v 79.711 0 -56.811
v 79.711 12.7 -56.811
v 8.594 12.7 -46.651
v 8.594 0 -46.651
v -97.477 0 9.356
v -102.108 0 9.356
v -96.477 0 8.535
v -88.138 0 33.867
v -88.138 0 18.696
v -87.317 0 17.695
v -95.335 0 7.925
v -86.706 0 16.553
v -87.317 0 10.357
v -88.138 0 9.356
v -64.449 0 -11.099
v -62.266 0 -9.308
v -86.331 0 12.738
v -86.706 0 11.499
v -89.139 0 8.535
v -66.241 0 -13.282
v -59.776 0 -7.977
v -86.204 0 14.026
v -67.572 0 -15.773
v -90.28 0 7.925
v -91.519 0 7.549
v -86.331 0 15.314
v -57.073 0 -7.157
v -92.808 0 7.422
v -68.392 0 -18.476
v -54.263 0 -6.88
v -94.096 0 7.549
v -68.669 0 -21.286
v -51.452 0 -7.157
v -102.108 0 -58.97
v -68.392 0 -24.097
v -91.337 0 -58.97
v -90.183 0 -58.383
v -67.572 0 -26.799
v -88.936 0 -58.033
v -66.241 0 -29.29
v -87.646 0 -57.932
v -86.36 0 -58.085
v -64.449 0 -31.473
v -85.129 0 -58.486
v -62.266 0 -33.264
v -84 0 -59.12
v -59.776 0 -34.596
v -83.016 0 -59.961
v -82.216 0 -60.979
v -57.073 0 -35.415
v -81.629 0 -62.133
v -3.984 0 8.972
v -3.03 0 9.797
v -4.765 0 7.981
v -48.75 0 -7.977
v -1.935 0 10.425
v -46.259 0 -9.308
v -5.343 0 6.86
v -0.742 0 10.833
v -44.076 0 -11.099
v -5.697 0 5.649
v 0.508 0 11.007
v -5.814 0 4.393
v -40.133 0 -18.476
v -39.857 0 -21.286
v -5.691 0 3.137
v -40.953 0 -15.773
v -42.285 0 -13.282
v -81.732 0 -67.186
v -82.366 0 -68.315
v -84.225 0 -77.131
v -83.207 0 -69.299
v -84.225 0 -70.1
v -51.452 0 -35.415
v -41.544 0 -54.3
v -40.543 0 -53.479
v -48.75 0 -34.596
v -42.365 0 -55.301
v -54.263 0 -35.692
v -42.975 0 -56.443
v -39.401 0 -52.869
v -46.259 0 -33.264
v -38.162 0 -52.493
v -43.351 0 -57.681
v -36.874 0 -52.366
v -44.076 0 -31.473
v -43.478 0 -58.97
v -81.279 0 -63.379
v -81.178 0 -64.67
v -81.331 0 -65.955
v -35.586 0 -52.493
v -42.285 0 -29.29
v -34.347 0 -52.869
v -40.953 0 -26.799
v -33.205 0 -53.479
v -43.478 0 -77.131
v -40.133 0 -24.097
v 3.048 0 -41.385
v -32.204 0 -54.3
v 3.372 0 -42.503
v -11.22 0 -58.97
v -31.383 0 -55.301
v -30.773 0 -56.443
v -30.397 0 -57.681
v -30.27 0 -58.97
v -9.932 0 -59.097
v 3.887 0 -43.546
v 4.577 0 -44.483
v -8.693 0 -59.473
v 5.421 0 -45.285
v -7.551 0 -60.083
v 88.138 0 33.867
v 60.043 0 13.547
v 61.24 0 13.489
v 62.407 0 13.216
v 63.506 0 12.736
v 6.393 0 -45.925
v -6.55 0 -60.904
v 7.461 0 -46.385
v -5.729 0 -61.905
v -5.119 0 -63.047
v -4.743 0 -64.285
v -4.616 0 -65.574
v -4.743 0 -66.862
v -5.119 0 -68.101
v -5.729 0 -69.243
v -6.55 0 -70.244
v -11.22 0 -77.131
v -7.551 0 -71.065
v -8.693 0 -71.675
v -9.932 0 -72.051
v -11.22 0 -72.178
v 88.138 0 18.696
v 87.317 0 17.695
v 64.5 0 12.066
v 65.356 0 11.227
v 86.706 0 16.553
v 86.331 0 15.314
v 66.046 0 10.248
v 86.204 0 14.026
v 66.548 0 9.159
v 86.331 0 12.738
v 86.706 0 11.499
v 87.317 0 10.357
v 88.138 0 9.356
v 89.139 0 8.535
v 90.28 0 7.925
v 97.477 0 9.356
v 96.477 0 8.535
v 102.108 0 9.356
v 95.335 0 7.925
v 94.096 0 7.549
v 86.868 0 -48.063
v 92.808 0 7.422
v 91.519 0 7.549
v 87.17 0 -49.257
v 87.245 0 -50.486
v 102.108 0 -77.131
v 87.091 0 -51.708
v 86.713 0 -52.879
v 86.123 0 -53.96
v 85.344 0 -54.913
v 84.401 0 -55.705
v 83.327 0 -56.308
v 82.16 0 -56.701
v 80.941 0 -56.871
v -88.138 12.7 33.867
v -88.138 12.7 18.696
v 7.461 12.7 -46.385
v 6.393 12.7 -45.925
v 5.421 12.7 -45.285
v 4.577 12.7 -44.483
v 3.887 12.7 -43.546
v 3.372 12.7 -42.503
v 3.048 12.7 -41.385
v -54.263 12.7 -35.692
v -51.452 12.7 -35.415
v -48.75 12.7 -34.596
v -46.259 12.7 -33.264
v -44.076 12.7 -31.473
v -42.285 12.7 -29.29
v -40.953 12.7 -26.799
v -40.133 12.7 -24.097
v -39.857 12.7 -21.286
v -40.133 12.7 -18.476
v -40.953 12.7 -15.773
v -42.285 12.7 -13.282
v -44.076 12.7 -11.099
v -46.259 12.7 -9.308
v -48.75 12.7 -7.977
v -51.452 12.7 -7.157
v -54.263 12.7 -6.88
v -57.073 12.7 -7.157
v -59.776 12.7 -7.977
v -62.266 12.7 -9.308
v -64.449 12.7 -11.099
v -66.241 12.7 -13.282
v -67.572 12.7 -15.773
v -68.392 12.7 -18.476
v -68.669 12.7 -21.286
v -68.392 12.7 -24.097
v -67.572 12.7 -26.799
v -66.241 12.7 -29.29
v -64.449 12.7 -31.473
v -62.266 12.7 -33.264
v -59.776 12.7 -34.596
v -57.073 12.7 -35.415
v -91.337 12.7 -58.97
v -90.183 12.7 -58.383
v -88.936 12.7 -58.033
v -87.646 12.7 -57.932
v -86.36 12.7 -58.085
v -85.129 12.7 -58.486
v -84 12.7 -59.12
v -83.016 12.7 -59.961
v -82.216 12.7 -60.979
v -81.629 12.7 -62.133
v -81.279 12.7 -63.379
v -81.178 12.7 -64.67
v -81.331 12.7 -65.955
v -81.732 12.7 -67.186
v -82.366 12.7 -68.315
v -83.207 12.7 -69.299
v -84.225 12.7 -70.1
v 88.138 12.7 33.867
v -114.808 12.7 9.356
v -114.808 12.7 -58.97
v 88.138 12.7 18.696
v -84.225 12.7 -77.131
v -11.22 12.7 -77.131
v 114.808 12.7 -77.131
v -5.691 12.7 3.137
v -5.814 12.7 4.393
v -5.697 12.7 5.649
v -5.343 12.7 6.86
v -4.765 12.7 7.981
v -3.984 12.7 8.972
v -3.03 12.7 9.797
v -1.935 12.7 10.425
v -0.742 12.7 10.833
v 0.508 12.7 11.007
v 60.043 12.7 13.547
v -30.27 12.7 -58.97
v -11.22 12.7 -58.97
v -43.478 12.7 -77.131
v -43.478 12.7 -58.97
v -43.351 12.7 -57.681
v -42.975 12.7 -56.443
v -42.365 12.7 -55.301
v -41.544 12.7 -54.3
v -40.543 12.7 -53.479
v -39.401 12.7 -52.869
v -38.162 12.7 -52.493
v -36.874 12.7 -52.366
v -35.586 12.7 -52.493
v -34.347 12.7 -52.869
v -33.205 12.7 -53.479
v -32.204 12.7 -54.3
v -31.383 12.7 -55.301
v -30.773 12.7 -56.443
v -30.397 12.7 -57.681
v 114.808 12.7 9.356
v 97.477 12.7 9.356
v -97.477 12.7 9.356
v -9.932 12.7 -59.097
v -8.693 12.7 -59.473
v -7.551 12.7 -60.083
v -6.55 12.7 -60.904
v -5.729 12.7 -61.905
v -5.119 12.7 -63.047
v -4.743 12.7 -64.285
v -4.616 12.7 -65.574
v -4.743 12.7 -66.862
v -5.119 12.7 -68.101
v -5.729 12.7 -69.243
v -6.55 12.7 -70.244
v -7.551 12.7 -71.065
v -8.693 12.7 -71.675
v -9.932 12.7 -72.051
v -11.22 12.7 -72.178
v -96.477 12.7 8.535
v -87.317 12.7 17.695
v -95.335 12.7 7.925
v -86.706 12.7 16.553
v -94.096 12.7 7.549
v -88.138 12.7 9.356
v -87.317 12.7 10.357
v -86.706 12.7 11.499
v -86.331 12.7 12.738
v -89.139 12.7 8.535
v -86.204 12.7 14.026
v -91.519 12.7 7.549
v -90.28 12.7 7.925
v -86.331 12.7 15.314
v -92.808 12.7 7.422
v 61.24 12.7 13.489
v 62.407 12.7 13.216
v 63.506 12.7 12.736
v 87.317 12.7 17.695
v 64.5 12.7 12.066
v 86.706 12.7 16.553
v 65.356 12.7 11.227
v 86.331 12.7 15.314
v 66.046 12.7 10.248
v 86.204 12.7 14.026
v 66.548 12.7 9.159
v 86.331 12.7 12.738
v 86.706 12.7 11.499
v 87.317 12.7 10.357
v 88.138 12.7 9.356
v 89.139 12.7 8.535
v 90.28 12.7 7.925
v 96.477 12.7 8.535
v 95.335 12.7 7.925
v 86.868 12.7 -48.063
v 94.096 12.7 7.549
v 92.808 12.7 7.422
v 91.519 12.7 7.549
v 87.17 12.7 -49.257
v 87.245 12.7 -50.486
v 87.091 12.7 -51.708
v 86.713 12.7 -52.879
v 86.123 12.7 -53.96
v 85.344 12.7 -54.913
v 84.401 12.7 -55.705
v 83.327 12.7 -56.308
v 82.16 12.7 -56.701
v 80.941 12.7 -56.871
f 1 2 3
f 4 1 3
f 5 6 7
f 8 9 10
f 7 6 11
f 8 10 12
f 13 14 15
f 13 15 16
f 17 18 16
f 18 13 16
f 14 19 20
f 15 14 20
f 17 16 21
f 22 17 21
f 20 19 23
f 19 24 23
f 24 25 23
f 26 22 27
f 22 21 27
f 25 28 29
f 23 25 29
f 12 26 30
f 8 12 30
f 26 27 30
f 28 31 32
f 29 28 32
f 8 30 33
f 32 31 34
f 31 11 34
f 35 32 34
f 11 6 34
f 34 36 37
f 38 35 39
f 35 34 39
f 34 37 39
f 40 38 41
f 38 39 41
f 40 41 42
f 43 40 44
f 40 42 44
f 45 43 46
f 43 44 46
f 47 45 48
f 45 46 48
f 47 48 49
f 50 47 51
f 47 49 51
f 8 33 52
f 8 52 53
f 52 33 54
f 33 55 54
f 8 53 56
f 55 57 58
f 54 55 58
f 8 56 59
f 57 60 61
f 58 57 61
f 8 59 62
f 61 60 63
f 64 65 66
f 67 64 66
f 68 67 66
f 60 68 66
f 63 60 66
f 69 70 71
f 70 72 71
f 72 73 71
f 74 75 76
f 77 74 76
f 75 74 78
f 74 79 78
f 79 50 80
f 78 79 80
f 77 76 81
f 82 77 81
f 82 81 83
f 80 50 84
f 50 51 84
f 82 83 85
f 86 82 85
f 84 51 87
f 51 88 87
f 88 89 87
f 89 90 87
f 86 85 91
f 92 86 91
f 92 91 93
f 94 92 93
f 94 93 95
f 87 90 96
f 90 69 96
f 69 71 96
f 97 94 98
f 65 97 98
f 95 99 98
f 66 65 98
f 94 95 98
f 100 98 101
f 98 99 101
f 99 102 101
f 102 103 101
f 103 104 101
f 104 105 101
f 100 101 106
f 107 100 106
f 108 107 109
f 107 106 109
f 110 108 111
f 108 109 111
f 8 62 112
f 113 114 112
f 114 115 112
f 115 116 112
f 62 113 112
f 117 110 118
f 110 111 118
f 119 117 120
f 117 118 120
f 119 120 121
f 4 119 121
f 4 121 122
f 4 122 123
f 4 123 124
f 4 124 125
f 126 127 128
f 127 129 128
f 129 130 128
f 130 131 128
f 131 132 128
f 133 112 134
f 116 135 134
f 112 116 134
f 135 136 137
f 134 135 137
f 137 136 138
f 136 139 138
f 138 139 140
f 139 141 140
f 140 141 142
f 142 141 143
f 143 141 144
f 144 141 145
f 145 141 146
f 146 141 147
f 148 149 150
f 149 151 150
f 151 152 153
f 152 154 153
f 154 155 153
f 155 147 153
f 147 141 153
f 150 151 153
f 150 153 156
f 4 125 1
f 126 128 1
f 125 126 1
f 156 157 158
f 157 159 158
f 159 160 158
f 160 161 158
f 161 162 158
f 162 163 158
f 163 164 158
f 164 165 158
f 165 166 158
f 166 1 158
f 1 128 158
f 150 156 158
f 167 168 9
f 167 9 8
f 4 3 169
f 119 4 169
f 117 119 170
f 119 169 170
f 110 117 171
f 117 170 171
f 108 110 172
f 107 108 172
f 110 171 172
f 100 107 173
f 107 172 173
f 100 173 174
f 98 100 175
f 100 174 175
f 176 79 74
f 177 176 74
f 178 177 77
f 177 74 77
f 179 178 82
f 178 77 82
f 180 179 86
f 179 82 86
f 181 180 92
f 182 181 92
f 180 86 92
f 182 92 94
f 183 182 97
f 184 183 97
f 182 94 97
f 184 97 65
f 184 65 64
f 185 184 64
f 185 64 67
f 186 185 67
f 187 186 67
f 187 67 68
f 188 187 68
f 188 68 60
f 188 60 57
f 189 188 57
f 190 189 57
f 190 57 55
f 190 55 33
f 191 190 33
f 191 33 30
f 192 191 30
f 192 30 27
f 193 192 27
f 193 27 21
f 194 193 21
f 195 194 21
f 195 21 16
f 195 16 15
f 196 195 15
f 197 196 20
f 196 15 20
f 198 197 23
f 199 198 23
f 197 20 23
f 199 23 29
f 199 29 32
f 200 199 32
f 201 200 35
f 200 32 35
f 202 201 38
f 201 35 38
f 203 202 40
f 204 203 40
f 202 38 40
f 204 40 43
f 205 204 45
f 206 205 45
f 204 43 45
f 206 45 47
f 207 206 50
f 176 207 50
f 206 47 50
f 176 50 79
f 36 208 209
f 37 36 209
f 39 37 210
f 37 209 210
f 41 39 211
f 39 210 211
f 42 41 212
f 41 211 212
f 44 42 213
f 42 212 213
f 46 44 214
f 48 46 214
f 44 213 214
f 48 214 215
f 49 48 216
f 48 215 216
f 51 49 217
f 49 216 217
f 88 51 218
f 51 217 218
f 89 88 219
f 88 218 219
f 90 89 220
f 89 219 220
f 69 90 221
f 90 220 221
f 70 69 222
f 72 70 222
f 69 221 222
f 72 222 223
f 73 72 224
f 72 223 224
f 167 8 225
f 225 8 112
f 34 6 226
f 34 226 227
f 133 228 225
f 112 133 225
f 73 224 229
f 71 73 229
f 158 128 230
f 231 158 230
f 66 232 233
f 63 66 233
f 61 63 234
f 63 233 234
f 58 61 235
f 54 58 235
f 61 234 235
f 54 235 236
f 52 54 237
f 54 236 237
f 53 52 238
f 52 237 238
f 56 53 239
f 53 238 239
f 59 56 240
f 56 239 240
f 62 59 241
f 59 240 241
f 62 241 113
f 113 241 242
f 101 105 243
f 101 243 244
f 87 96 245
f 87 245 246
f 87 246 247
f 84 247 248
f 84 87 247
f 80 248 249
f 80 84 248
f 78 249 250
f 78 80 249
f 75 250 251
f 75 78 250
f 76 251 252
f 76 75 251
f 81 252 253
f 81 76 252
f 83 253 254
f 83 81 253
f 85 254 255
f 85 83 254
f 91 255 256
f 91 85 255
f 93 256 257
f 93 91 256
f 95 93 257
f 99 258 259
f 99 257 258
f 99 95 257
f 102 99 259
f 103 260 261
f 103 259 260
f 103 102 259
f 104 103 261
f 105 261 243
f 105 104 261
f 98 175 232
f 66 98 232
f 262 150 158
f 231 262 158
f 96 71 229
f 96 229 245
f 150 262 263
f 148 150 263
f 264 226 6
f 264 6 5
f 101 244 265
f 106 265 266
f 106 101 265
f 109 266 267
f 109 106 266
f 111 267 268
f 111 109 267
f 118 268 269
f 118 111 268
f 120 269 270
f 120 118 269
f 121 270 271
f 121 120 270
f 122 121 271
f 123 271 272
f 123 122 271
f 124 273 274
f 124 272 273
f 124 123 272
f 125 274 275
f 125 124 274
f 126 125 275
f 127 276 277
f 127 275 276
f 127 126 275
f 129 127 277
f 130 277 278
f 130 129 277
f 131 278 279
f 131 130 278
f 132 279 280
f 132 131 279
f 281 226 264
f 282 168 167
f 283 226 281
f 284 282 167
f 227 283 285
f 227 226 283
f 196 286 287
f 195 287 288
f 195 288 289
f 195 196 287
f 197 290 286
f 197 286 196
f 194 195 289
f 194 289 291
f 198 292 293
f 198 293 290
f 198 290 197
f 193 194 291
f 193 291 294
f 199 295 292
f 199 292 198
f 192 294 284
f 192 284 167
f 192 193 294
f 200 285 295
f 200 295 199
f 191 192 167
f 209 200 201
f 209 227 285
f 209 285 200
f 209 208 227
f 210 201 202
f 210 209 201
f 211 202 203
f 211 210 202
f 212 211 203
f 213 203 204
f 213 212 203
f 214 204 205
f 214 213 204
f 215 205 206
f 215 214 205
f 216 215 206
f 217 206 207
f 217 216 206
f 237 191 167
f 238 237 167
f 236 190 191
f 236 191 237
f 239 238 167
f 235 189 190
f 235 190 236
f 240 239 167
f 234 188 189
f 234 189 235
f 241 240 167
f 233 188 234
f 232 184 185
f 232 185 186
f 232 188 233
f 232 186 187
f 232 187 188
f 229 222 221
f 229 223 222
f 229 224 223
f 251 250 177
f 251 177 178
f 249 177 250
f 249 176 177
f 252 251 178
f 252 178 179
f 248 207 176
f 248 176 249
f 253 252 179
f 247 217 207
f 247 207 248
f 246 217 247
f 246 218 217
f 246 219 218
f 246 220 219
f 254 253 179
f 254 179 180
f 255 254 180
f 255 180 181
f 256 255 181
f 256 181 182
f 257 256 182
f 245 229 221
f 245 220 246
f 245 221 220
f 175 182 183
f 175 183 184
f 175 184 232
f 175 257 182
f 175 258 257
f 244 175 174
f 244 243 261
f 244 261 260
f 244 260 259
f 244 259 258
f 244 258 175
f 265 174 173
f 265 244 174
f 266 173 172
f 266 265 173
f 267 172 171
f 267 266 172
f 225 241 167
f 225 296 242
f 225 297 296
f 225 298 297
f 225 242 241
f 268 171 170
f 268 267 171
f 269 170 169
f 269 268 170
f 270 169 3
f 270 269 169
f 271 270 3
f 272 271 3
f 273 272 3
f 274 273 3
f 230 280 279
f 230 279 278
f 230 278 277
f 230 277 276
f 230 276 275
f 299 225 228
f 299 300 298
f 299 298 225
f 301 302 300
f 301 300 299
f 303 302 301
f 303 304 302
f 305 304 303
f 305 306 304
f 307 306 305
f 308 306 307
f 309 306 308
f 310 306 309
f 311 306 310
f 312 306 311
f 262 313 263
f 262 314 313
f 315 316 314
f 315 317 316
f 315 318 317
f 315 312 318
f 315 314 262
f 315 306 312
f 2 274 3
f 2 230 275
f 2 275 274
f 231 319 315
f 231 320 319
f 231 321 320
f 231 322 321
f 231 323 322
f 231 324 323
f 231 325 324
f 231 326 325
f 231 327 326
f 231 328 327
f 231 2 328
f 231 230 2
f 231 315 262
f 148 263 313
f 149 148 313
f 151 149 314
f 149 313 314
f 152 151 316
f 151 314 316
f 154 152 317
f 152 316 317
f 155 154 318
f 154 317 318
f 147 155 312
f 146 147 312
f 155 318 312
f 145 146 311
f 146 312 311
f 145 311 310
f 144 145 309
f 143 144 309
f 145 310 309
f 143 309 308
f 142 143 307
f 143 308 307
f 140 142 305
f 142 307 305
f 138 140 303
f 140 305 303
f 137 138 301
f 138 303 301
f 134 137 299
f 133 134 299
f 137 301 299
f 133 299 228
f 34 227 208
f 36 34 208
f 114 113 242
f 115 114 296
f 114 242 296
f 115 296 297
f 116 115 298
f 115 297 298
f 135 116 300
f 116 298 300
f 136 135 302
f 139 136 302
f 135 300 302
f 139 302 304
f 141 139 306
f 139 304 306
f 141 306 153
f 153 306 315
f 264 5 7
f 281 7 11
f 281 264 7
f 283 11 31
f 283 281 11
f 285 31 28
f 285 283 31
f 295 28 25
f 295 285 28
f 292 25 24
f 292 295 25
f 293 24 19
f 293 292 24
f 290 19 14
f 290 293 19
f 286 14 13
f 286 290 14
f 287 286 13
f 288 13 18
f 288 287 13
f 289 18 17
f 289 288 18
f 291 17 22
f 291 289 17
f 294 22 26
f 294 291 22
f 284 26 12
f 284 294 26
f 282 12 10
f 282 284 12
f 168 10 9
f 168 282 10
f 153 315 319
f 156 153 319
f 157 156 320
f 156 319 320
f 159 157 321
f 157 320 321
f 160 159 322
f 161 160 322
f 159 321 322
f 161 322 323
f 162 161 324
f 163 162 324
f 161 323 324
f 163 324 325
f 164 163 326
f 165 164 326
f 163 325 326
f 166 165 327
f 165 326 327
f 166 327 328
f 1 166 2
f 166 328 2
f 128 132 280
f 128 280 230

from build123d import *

# Parameters (mm, degrees)
SKETCH1_W           = 229.616
SKETCH1_H           = 110.998
BOSS_EXTRUDE1_DEPTH = 12.7
DRAFT1_ANGLE        = -45
CUT_EXTRUDE1_DEPTH  = 139.893248743
CUT_EXTRUDE2_DEPTH  = 139.893248743
CUT_EXTRUDE3_DEPTH  = 139.893248743
SKETCH5_R           = 14.406124238
CUT_EXTRUDE4_DEPTH  = 139.893248743


with BuildPart() as part:
    # Sketch1 → Boss-Extrude1 (new body)
    with BuildSketch(Plane(origin=(0, 0, 0), x_dir=(1, 0, 0), z_dir=(0, 1, 0))):
        with Locations((0, 21.631847801)):
            Rectangle(SKETCH1_W, SKETCH1_H)
    extrude(amount=BOSS_EXTRUDE1_DEPTH)

    # Draft1
    draft1_faces = [part.faces().sort_by_distance(p)[0] for p in [
        (-114.808, 6.35, -21.631847801),
        (114.808, 6.35, -21.631847801),
    ]]
    draft(draft1_faces, Plane.ZX.offset(12.7), DRAFT1_ANGLE)

    # Sketch2 → Cut-Extrude1 (cut, through all)
    with BuildSketch(Plane(origin=(0, 12.7, 0), x_dir=(1, 0, 0), z_dir=(0, 1, 0))):
        with BuildLine():
            Line((-114.808, -9.356152199), (-97.477466366, -9.356152199))
            ThreePointArc((-97.477466366, -9.356152199), (-88.138, -9.356152199), (-88.138, -18.695618565))
            Line((-88.138, -18.695618565), (-88.138, -33.867152199))
            Line((-88.138, -33.867152199), (-114.808, -33.867152199))
            Line((-114.808, -33.867152199), (-114.808, -9.356152199))
        make_face()
        with BuildLine():
            Line((114.808, -33.867152199), (114.808, -9.356152199))
            Line((114.808, -9.356152199), (97.477466366, -9.356152199))
            ThreePointArc((97.477466366, -9.356152199), (88.138, -9.356152199), (88.138, -18.695618565))
            Line((88.138, -18.695618565), (88.138, -33.867152199))
            Line((88.138, -33.867152199), (114.808, -33.867152199))
        make_face()
        with BuildLine():
            Line((-114.808, 58.969847801), (-91.336585113, 58.969847801))
            ThreePointArc((-91.336585113, 58.969847801), (-82.215723928, 60.978708985), (-84.224585113, 70.099570169))
            Line((-84.224585113, 70.099570169), (-84.224585113, 77.130847801))
            Line((-84.224585113, 77.130847801), (-114.808, 77.130847801))
            Line((-114.808, 77.130847801), (-114.808, 58.969847801))
        make_face()
    extrude(amount=-CUT_EXTRUDE1_DEPTH, mode=Mode.SUBTRACT)

    # Sketch3 → Cut-Extrude2 (cut, through all)
    with BuildSketch(Plane(origin=(0, 12.7, 0), x_dir=(1, 0, 0), z_dir=(0, 1, 0))):
        with BuildLine():
            Line((3.048, 41.385190987), (-5.690853499, -3.137191319))
            ThreePointArc((-5.690853499, -3.137191319), (-4.398442962, -8.495486175), (0.508, -11.007152199))
            Line((0.508, -11.007152199), (60.043235464, -13.547152199))
            ThreePointArc((60.043235464, -13.547152199), (64.017965036, -12.423899948), (66.548, -9.159073174))
            Line((66.548, -9.159073174), (86.868, 48.063309133))
            ThreePointArc((86.868, 48.063309133), (85.755892247, 54.455195083), (79.710737995, 56.810847801))
            Line((79.710737995, 56.810847801), (8.59435603, 46.650847801))
            ThreePointArc((8.59435603, 46.650847801), (4.981382787, 44.902582041), (3.048, 41.385190987))
        make_face()
    extrude(amount=-CUT_EXTRUDE2_DEPTH, mode=Mode.SUBTRACT)

    # Sketch4 → Cut-Extrude3 (cut, through all)
    with BuildSketch(Plane.XZ):
        with BuildLine():
            Line((-43.477968603, -77.130847801), (-43.477968603, -58.969847801))
            ThreePointArc((-43.477968603, -58.969847801), (-36.873968603, -52.365847801), (-30.269968603, -58.969847801))
            Line((-30.269968603, -58.969847801), (-11.219968603, -58.969847801))
            ThreePointArc((-11.219968603, -58.969847801), (-4.615968603, -65.573847801), (-11.219968603, -72.177847801))
            Line((-11.219968603, -72.177847801), (-11.219968603, -77.130847801))
            Line((-11.219968603, -77.130847801), (-43.477968603, -77.130847801))
        make_face()
    extrude(amount=-CUT_EXTRUDE3_DEPTH, mode=Mode.SUBTRACT)

    # Sketch5 → Cut-Extrude4 (cut, through all)
    with BuildSketch(Plane.XZ):
        with Locations(Location((-54.2628102, -21.286098046, 0), (0, 0, 270))):
            Circle(SKETCH5_R)
    extrude(amount=-CUT_EXTRUDE4_DEPTH, mode=Mode.SUBTRACT)


solid = part.part
